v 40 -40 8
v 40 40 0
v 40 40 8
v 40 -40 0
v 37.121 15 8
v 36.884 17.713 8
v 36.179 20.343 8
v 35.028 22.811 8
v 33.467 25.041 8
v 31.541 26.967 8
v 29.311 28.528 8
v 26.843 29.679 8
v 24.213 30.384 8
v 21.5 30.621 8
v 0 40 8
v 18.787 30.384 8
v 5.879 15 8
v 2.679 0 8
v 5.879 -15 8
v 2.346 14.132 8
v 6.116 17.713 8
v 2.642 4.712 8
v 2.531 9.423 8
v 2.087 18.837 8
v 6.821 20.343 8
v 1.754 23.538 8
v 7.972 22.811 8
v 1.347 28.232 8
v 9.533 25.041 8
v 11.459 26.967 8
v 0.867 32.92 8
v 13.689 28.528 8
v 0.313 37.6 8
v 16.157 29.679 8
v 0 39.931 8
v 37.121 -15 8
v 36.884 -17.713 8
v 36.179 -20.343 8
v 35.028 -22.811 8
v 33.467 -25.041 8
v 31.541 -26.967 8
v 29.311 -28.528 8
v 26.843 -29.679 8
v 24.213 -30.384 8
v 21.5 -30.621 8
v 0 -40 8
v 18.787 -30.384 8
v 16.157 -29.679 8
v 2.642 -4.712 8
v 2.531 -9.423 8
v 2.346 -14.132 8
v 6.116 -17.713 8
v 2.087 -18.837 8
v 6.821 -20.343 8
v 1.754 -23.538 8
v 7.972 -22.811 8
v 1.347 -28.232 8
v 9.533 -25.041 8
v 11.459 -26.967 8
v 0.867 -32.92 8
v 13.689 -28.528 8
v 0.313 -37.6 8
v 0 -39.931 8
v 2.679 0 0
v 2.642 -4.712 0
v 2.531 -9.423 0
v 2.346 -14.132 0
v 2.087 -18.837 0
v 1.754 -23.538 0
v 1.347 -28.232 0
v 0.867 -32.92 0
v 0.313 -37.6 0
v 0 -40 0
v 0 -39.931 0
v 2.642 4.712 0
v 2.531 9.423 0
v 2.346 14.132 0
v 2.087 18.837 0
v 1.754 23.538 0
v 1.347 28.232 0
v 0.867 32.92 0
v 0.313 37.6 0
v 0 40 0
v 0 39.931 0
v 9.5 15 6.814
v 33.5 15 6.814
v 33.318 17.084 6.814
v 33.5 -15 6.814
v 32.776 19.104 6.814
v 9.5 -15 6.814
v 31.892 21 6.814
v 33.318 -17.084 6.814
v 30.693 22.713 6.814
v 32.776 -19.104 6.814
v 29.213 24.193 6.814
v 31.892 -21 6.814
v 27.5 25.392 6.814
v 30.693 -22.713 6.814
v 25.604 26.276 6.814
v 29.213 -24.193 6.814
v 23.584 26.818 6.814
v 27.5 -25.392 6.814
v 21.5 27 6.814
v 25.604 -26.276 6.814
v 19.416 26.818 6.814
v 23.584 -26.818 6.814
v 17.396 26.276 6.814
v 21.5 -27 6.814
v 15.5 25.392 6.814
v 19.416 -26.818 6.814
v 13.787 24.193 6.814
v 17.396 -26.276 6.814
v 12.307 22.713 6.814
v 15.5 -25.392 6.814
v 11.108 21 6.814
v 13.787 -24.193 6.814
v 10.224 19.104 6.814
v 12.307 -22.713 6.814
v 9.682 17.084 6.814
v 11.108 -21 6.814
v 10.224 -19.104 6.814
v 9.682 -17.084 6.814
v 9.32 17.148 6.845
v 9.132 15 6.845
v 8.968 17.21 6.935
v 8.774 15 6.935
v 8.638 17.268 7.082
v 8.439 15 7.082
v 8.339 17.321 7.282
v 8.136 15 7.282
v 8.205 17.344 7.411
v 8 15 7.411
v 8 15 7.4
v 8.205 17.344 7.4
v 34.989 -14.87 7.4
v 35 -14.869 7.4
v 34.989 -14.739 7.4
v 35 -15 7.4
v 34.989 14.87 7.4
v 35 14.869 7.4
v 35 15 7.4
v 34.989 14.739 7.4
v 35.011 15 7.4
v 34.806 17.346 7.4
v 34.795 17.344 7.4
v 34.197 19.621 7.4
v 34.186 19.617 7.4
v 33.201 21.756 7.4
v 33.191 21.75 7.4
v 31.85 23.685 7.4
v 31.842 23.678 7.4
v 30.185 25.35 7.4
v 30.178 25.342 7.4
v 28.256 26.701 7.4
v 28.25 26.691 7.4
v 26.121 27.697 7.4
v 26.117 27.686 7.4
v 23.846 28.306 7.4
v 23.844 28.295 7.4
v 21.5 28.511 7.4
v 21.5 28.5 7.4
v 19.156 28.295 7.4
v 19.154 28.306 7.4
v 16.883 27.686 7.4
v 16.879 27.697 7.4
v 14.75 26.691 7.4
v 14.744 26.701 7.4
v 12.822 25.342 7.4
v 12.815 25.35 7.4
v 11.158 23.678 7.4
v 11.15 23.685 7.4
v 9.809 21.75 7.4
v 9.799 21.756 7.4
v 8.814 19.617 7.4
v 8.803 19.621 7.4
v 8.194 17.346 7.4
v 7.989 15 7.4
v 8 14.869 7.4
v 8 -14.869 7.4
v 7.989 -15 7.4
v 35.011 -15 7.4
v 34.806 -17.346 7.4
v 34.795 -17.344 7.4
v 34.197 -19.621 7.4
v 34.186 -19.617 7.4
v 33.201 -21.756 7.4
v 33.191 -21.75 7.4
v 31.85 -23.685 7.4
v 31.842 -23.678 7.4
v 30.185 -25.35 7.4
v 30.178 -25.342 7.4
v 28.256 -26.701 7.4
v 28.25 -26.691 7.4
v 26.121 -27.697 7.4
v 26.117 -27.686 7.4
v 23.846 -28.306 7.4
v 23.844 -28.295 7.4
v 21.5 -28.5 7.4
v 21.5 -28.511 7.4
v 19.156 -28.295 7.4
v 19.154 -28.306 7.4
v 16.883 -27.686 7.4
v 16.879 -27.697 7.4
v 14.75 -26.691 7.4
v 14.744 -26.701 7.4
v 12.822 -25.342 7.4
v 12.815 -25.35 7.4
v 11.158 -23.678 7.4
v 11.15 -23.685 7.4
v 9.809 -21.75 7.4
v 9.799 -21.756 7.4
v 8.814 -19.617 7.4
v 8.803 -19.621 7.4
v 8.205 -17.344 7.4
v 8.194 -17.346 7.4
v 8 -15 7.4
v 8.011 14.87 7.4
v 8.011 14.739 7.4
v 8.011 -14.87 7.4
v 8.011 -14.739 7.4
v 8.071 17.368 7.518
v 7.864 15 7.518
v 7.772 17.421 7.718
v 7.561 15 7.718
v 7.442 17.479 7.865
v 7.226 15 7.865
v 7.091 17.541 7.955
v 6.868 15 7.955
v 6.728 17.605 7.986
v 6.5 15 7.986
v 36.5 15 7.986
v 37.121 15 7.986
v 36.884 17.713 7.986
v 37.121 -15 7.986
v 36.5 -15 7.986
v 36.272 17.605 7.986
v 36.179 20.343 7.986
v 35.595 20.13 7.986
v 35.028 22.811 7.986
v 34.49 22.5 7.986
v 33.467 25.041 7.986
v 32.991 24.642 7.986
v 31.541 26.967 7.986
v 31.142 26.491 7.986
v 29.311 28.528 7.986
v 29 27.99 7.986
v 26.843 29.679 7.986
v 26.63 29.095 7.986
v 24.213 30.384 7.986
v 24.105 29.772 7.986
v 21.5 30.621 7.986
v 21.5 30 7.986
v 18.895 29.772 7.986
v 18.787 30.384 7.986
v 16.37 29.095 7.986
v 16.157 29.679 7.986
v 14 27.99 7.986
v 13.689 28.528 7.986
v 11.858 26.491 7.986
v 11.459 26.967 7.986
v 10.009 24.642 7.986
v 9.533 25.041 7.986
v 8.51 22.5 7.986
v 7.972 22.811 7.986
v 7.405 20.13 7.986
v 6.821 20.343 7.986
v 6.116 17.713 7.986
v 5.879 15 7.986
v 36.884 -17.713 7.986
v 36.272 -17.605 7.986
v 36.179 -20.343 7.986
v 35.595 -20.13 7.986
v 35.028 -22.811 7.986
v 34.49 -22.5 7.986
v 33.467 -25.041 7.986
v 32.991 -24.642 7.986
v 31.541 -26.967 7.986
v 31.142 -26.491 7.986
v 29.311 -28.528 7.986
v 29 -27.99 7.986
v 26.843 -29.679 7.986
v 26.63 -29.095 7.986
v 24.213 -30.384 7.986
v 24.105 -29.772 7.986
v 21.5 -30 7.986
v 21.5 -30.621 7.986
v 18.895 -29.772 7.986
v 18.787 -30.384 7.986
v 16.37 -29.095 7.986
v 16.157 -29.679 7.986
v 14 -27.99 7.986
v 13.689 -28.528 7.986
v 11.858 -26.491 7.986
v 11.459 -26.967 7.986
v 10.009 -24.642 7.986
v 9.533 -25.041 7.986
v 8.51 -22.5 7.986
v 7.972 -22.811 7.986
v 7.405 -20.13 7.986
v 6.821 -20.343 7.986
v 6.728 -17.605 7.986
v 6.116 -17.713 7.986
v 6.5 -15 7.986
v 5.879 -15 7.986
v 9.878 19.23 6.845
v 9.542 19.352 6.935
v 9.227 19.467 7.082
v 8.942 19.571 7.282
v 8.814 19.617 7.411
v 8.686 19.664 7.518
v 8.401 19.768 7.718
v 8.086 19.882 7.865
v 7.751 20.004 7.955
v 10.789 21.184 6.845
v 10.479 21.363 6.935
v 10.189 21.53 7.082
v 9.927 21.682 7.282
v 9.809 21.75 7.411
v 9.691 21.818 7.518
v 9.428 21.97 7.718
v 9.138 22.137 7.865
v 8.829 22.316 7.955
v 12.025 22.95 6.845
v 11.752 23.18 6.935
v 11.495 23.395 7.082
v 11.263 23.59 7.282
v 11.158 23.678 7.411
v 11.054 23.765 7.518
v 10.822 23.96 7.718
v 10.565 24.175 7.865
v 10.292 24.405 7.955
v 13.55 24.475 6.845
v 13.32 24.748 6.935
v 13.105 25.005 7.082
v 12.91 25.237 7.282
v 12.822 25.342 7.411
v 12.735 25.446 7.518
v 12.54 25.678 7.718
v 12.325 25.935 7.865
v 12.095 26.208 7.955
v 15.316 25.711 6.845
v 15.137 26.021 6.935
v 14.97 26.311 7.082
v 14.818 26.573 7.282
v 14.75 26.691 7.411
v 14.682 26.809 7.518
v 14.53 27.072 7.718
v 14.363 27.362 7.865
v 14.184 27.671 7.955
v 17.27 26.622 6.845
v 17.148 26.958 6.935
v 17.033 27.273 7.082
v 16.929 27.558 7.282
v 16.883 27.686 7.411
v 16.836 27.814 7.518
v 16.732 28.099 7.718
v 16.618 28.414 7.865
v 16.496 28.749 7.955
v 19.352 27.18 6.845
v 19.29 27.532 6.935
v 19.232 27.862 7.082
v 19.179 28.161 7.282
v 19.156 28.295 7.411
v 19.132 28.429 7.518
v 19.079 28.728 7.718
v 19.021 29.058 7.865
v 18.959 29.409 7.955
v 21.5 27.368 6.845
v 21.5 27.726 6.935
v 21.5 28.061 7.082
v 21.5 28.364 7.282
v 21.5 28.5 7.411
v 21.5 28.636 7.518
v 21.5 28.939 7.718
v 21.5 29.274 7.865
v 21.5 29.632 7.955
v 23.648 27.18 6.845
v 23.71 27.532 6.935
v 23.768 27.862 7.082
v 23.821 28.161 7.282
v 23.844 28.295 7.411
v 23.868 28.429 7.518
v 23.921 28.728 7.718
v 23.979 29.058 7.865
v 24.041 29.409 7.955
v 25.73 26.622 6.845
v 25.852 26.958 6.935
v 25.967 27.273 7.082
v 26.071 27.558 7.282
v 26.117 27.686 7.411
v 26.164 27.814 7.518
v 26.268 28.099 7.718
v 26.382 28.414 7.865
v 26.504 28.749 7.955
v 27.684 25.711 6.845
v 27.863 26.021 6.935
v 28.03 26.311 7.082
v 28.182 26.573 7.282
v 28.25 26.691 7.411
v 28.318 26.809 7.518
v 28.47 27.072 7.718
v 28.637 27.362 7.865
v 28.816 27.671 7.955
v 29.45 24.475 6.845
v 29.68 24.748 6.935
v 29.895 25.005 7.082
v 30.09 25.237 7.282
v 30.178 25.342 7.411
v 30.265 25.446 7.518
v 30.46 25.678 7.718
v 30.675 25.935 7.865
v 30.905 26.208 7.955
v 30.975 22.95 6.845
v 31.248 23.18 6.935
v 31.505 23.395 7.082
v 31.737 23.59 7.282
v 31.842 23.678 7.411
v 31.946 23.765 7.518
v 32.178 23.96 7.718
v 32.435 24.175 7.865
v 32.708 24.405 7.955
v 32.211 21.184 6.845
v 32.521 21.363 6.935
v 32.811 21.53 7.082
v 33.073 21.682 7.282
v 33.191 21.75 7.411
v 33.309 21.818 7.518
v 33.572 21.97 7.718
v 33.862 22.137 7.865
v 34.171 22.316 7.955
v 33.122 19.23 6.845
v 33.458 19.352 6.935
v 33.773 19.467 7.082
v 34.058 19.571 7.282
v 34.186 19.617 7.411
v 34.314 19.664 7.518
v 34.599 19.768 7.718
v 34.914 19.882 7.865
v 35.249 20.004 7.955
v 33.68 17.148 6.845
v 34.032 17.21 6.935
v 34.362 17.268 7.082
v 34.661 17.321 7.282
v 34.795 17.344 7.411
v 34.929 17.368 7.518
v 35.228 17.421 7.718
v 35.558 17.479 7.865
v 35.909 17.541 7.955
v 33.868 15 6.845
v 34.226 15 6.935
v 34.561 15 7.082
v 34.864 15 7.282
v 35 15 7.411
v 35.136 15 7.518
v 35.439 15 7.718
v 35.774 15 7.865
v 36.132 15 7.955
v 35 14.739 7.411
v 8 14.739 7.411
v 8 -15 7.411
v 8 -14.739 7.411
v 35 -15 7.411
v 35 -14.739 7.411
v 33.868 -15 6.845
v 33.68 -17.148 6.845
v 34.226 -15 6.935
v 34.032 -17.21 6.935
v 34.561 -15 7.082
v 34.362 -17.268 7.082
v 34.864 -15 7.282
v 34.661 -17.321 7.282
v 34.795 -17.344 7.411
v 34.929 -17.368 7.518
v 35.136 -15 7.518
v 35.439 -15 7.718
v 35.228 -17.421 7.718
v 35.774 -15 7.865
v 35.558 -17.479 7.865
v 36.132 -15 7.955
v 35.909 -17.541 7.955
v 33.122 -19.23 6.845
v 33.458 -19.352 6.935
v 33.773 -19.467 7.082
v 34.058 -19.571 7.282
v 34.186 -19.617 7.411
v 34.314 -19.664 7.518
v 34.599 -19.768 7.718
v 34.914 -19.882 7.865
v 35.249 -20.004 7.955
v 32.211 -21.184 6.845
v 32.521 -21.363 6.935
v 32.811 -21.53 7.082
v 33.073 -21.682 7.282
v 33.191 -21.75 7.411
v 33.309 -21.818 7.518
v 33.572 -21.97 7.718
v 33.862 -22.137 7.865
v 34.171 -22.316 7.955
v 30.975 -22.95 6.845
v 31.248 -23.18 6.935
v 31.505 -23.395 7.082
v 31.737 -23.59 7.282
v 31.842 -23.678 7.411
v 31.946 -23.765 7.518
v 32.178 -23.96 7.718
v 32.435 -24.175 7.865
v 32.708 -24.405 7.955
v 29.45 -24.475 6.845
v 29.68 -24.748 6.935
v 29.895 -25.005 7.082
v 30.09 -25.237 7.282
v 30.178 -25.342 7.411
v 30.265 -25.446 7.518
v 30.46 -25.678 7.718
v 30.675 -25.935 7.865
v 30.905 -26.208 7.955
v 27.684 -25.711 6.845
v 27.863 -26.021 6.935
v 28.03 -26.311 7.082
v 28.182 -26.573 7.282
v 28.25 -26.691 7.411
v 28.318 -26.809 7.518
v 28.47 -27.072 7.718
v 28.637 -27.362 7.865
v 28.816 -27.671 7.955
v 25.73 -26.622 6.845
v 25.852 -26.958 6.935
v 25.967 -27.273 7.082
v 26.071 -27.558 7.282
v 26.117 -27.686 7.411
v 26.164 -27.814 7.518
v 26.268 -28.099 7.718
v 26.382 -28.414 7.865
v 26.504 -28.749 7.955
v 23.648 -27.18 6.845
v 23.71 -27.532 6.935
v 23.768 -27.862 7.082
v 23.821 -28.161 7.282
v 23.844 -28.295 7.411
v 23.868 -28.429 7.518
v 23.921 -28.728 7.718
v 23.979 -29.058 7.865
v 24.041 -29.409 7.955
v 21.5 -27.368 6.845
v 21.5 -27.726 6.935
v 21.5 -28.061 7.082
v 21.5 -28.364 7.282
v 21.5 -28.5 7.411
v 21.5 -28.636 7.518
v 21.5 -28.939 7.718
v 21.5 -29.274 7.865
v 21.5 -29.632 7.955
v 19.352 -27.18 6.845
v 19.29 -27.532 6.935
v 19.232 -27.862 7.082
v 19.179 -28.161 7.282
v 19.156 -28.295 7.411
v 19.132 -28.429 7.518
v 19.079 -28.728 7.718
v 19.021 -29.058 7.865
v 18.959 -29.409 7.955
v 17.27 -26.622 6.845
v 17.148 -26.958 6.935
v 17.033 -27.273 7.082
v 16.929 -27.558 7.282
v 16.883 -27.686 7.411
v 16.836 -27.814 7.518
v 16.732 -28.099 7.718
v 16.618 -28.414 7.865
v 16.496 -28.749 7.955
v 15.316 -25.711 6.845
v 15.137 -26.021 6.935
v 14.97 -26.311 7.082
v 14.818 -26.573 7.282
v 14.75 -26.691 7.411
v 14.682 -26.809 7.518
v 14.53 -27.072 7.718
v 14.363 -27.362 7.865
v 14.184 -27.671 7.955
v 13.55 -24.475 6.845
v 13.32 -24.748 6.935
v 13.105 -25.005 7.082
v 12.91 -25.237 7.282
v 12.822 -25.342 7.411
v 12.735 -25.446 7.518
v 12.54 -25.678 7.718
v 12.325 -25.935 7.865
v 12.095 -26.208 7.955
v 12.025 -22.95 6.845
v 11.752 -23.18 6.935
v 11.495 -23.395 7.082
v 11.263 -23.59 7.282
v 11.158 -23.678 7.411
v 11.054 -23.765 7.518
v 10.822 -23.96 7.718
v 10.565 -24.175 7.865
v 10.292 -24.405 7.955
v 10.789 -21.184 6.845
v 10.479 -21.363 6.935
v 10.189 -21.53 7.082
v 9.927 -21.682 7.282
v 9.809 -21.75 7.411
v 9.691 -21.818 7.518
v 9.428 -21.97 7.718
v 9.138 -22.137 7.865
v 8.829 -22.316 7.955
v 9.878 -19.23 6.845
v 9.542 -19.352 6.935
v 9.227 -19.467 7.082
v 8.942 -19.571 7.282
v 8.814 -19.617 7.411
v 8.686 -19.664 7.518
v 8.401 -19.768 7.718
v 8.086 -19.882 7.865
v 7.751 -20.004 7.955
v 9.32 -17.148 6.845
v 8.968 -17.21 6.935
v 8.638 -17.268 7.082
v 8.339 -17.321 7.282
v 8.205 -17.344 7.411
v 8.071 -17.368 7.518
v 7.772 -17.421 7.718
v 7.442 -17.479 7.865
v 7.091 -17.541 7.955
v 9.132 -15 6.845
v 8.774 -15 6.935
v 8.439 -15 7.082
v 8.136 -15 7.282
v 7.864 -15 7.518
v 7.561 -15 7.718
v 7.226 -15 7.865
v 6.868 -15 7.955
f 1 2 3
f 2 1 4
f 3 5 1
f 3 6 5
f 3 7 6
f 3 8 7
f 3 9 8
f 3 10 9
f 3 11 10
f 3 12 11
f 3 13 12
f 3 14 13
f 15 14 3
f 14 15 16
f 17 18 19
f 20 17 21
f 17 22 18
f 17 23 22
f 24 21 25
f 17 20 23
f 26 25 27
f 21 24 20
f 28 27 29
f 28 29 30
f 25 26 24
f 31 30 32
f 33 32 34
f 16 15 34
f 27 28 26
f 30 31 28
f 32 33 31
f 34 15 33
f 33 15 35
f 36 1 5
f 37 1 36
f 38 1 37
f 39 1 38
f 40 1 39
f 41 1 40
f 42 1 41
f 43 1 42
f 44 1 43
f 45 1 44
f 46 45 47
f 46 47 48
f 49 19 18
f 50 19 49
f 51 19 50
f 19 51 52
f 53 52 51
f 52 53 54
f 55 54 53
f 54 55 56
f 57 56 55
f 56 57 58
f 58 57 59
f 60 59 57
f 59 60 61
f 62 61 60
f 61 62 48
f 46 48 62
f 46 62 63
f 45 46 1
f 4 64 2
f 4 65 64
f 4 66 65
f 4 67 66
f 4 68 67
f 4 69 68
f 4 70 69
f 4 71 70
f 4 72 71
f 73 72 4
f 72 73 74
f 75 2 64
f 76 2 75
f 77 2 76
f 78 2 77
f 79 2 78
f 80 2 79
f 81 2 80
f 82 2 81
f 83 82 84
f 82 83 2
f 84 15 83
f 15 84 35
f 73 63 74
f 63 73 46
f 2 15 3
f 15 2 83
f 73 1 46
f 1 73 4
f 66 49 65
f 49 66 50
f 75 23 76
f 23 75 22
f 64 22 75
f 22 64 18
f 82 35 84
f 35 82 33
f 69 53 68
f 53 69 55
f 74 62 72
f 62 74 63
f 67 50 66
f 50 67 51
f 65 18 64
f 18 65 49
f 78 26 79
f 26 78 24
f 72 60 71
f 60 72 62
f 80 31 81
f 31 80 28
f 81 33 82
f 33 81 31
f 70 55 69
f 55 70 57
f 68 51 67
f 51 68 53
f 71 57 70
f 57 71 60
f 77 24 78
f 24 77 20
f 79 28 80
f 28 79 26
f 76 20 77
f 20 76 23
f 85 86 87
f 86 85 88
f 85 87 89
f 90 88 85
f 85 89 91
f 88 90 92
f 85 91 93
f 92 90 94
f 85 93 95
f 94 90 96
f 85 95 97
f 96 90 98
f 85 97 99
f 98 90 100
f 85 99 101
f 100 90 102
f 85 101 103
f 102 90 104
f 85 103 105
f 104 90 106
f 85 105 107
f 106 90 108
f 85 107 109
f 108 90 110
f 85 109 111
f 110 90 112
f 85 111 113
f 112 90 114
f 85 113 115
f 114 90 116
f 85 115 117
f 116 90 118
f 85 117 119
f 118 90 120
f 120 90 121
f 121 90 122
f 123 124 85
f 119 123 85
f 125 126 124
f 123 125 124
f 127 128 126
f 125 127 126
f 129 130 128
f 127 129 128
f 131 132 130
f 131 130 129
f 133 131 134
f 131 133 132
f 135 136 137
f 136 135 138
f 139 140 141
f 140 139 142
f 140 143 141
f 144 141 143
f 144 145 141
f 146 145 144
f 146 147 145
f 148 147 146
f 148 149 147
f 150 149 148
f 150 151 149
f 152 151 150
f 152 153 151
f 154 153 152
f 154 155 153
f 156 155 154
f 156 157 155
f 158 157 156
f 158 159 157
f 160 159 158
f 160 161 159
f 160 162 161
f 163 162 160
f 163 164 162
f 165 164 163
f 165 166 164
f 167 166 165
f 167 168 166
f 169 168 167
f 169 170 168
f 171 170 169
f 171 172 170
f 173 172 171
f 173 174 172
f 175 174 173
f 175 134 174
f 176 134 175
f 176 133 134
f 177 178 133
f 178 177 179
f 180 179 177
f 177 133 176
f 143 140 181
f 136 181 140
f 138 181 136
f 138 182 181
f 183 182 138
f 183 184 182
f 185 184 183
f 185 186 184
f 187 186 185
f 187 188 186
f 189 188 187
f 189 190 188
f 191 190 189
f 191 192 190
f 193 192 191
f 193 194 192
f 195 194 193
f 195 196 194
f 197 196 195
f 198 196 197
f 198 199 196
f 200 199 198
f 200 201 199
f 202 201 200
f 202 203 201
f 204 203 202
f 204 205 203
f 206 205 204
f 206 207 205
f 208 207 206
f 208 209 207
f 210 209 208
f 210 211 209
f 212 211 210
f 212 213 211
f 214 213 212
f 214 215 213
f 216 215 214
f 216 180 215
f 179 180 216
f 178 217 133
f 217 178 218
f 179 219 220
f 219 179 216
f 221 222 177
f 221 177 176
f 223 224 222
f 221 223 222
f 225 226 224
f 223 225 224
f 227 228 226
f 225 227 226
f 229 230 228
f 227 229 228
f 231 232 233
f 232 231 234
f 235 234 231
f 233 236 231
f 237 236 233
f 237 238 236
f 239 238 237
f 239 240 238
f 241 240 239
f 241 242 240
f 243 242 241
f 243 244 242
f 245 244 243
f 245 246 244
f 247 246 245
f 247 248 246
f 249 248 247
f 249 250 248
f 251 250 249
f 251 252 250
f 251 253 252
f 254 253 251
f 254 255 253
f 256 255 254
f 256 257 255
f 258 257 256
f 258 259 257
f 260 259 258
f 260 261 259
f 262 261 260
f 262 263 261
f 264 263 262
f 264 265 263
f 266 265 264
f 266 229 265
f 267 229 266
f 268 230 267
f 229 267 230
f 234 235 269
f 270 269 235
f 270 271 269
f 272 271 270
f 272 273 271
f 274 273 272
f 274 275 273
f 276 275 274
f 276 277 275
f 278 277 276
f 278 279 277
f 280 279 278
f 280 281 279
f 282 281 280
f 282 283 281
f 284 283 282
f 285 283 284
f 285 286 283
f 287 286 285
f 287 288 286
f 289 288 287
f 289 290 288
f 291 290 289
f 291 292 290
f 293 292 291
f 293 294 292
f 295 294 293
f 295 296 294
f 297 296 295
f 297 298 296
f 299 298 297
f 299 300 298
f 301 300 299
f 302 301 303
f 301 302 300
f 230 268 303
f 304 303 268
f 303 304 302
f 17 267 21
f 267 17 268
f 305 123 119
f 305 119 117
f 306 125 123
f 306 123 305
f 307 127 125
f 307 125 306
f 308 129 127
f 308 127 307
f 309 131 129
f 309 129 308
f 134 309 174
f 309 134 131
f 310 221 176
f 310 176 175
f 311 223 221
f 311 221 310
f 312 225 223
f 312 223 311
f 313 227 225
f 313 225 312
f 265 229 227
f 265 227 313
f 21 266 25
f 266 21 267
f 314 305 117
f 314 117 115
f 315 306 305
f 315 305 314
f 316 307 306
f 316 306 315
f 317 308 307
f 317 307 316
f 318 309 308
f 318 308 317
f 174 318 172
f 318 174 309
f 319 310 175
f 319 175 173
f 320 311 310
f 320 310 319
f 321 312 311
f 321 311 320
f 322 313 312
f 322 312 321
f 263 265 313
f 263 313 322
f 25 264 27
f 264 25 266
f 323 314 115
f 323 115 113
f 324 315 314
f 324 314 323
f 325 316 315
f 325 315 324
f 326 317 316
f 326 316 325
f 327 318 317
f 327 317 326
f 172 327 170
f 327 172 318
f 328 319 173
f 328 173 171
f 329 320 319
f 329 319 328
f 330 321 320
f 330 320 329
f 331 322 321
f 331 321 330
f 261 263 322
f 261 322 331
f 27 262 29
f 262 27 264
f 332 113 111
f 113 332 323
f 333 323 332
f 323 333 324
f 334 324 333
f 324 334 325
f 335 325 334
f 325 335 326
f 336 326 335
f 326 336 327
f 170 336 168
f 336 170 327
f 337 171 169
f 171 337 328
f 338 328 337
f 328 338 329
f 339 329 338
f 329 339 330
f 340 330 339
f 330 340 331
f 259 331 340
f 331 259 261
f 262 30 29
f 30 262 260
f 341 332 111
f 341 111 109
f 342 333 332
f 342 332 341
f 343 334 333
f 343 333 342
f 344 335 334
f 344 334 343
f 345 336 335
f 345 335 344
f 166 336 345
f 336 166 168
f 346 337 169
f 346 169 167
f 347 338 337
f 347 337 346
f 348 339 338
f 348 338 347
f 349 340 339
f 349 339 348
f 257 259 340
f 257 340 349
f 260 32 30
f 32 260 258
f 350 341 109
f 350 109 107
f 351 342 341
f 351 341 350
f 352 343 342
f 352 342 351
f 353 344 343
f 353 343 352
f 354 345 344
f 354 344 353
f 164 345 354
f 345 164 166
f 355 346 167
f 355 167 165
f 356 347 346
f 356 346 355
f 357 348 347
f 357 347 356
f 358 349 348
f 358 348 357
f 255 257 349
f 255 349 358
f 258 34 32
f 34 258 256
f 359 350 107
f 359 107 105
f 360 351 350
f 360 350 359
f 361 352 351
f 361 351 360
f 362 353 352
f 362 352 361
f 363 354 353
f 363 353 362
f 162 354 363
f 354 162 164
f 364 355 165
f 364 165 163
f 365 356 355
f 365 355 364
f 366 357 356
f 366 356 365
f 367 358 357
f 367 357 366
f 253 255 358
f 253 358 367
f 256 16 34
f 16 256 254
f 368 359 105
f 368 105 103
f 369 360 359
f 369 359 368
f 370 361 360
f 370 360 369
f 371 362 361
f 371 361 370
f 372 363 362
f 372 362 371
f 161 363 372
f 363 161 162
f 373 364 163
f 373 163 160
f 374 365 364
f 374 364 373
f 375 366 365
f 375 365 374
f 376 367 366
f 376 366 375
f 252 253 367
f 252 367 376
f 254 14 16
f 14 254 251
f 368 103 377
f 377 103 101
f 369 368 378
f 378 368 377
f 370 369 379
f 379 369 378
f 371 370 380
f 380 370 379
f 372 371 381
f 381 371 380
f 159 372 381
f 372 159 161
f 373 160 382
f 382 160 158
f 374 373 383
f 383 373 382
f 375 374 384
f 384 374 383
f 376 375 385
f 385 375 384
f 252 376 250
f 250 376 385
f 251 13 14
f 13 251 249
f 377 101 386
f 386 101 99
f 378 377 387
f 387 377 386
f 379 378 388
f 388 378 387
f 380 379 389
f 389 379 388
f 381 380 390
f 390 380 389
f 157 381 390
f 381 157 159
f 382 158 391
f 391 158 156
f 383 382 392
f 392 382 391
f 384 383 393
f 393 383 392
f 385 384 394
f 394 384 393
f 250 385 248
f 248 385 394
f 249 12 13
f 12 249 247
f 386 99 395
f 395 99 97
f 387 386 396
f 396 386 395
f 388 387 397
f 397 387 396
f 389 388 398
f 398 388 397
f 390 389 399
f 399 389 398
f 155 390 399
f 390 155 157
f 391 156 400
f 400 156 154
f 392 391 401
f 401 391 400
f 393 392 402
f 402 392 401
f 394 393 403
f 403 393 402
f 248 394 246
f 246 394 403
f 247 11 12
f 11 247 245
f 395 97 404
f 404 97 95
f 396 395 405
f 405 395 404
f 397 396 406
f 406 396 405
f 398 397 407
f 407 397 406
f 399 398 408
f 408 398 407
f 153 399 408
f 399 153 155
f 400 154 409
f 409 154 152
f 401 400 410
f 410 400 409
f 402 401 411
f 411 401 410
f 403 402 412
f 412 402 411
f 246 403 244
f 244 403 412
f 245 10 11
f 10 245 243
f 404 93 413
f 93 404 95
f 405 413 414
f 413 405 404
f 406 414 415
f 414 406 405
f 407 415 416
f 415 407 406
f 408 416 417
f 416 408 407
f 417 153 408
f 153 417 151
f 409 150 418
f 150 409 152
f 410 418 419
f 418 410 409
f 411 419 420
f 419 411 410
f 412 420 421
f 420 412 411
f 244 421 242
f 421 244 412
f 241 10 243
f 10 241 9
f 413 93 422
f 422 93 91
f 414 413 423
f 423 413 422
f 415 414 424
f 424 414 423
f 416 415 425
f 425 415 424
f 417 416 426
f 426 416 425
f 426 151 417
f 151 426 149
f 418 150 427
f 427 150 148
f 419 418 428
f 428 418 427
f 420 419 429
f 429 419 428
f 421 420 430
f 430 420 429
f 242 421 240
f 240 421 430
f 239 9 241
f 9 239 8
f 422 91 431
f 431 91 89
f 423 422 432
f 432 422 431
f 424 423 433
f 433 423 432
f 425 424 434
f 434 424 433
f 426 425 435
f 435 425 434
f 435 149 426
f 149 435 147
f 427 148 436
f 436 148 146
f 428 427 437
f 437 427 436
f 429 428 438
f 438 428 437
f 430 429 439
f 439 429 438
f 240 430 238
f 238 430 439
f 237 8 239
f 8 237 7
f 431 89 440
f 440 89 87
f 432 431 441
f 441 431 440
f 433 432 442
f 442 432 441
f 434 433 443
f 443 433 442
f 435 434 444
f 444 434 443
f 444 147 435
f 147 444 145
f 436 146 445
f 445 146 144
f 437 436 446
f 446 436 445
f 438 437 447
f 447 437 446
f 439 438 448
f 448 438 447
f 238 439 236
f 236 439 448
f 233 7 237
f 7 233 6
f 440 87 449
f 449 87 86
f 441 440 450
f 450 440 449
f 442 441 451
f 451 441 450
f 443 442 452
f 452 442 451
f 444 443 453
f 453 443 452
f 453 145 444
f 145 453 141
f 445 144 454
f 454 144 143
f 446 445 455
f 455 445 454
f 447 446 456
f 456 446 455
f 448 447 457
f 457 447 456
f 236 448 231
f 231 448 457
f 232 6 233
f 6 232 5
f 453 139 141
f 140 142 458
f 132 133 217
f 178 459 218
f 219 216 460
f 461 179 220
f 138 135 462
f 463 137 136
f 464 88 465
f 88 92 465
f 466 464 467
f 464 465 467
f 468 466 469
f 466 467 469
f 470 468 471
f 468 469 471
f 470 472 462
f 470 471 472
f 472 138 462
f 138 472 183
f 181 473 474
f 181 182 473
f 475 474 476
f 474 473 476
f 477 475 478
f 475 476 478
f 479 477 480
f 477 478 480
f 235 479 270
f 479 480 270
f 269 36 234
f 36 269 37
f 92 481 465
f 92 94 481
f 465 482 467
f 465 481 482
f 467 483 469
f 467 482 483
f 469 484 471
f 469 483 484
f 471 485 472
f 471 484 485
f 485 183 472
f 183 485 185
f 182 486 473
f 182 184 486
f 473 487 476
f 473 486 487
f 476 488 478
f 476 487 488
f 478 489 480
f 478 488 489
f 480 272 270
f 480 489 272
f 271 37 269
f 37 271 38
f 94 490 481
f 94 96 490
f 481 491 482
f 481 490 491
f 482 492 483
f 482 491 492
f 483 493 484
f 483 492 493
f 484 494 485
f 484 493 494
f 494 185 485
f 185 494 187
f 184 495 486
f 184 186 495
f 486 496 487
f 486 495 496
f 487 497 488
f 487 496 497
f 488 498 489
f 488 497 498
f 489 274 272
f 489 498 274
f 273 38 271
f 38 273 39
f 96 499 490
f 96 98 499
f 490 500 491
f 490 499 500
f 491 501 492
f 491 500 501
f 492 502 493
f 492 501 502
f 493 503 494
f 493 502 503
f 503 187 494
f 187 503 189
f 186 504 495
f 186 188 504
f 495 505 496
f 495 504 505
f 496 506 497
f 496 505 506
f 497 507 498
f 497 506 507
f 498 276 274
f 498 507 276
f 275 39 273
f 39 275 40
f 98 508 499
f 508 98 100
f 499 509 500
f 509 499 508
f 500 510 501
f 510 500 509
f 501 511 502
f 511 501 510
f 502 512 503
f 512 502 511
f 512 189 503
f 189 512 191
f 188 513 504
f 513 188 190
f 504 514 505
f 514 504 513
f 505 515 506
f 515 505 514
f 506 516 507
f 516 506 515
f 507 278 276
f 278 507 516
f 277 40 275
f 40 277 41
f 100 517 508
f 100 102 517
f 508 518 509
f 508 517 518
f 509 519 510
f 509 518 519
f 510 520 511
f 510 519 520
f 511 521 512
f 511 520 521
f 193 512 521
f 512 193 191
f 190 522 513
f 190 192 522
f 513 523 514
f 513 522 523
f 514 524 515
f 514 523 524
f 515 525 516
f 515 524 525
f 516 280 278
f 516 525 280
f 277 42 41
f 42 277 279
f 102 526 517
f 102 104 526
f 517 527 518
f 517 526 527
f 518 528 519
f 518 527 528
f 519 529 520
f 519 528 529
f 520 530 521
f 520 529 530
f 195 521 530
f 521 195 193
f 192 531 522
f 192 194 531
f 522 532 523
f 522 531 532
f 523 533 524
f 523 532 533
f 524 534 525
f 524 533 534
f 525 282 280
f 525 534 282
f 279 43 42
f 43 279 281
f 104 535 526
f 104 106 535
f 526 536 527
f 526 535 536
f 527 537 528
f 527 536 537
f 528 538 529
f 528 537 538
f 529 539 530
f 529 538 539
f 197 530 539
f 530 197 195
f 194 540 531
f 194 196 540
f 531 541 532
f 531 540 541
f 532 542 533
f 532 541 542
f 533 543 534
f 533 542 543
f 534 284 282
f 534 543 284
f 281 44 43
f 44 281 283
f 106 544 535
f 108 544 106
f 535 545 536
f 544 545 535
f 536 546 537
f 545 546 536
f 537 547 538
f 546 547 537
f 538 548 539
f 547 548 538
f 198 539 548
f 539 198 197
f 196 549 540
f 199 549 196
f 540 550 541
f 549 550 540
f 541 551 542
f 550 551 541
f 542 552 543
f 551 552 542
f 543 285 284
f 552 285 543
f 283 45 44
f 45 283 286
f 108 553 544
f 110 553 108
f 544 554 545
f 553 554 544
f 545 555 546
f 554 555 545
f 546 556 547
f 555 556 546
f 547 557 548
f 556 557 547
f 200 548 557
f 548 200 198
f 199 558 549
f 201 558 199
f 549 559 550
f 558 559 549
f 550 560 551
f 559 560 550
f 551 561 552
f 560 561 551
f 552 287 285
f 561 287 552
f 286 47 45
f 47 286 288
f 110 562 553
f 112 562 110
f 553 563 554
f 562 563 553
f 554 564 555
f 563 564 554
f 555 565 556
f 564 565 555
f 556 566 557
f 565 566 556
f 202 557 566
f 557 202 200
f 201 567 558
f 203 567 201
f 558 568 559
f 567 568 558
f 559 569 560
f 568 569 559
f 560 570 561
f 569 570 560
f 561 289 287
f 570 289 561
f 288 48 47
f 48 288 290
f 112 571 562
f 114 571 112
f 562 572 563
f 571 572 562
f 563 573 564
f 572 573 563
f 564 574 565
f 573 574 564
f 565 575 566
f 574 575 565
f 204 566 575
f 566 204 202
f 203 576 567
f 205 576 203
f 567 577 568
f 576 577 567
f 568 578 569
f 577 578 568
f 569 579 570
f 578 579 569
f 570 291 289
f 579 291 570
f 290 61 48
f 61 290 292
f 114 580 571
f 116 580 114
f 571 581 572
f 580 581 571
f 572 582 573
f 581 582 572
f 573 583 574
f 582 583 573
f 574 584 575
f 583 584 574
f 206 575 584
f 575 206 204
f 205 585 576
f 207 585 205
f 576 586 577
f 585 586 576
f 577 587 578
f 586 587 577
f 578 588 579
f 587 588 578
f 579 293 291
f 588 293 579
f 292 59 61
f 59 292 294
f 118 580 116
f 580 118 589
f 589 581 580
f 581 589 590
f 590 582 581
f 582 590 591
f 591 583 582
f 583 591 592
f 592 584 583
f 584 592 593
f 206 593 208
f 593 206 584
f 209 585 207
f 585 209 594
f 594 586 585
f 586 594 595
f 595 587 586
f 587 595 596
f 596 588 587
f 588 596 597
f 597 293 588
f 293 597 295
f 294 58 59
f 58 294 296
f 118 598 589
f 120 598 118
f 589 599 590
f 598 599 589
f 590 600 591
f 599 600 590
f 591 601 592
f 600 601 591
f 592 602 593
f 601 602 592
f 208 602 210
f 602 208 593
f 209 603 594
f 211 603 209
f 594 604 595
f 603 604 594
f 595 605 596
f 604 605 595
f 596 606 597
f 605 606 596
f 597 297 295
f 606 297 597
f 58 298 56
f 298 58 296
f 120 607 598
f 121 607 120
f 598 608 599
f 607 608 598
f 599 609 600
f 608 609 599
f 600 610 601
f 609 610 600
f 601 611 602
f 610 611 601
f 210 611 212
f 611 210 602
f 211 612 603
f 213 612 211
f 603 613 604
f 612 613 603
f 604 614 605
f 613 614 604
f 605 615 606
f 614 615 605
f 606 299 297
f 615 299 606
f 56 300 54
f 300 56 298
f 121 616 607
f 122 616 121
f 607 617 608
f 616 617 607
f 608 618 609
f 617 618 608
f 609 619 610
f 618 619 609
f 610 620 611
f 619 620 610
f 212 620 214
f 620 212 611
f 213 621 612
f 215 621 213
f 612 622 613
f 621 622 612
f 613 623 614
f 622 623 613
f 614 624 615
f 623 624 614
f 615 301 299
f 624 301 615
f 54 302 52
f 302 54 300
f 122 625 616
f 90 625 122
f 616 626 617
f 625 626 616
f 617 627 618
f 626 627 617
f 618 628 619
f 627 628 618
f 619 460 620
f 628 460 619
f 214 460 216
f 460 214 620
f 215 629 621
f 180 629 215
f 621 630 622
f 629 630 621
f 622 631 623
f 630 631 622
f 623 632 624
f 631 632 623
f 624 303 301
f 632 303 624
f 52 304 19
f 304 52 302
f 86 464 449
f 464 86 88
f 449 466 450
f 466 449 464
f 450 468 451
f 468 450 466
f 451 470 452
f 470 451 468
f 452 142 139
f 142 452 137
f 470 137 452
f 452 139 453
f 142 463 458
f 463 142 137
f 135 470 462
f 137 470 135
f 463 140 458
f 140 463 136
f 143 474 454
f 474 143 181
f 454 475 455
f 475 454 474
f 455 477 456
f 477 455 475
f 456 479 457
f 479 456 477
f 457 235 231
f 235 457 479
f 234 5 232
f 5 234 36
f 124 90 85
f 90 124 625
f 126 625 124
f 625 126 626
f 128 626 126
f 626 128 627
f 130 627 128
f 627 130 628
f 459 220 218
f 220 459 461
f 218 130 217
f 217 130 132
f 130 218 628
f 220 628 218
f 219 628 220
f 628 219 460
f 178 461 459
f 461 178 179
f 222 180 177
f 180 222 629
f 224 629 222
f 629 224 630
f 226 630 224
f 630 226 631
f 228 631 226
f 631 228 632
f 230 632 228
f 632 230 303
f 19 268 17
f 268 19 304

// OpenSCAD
$fs=.1; // decrease for finer details
$fa=10; // decrease for finer details

eps = 0.1;

// TODO: use as basis for plateR.
module rodR(len) {
	hull() {
		sphere(1);
		translate([len,0,0]) sphere(1);
	}
}

pot_r = 300;
handle_x = 40;
handle_y = 80;
handle_z =  8;
impression_depth = 2;
impression_margin = 10;
impression_curve = 3;

/* Pig's head shape. The "chin" is ogee-shaped. */
module ogee() {
	difference() {
		union() {
			circle(r=1);
			translate([sqrt(2)/2, -sqrt(2)/2]) square([1, 1]);
		}
		translate([sqrt(2), -sqrt(2)]) {
			circle(1);
			square([1, 1]);
		}
		translate([-1,-1]) square([1,2]);
	}
}

/*
 * The base cylinder of the bottle will be "baselen" long and have "radius".
 * The neck curve will be "curvelen" long.
 */
module asym_bottle(baselen=1, curvelen=1, radius=1) {
	translate([0, sqrt(2)-1]) scale([1,radius]) {
		translate([baselen,0])
		scale([curvelen/sqrt(2), 1])
		ogee();
	
		translate([0,-1]) square([baselen,2]);
	}
}

/*
 * Like rotate_extrude, but instead of making a circle (seen from above)
 * it makes a paper-clip shape (i.e. Nascar-track shape).
 */
module rotate_extrude_long(length, convexity=4) {
	translate([0, length/2, 0]) {
		rotate_extrude(convexity=convexity)
		child();
		
		translate([0,-length,0]) rotate_extrude(convexity=convexity)
		child();
	
		rotate([90,0,0])
		linear_extrude(height=length, convexity=convexity)
		child();
	
		mirror([1,0,0])
		rotate([90,0,0])
		linear_extrude(height=length, convexity=convexity)
		child();
	}
}

//rotate_extrude_long(length=5)
//asym_bottle(baselen = 5, curvelen = 1);

difference() {
	scale([1,1,handle_z])
	difference() {
		translate([0,-handle_y/2,0])
		cube([handle_x, handle_y, 1]);
	
		assign ($fn=400) {
			translate([0,0,-eps]) scale([pot_r,pot_r,1 + 2*eps])
				bite(handle_y / pot_r);
		}
	
	}

	*translate([impression_margin,
	           -handle_y/2 + impression_margin,
	           handle_z - impression_depth])
	cube([handle_x - 2*impression_margin,
	       handle_y - 2*impression_margin,
	       handle_z]);

	translate([21.5 /*TODO*/,
	           0,
	           handle_z + 0.4/*TODO*/])
	rotate_extrude_long(length = 30 /*TODO*/)
	asym_bottle(baselen = (handle_x - impression_margin - 2/*TODO*/*impression_curve) / 2,
	            curvelen = impression_curve,
	            radius = impression_depth);
}

module bite(width) {
	h = sqrt(1 - width*width/4);
	translate([-h, 0, 0])
	  cylinder(1, 1, 1);
}
